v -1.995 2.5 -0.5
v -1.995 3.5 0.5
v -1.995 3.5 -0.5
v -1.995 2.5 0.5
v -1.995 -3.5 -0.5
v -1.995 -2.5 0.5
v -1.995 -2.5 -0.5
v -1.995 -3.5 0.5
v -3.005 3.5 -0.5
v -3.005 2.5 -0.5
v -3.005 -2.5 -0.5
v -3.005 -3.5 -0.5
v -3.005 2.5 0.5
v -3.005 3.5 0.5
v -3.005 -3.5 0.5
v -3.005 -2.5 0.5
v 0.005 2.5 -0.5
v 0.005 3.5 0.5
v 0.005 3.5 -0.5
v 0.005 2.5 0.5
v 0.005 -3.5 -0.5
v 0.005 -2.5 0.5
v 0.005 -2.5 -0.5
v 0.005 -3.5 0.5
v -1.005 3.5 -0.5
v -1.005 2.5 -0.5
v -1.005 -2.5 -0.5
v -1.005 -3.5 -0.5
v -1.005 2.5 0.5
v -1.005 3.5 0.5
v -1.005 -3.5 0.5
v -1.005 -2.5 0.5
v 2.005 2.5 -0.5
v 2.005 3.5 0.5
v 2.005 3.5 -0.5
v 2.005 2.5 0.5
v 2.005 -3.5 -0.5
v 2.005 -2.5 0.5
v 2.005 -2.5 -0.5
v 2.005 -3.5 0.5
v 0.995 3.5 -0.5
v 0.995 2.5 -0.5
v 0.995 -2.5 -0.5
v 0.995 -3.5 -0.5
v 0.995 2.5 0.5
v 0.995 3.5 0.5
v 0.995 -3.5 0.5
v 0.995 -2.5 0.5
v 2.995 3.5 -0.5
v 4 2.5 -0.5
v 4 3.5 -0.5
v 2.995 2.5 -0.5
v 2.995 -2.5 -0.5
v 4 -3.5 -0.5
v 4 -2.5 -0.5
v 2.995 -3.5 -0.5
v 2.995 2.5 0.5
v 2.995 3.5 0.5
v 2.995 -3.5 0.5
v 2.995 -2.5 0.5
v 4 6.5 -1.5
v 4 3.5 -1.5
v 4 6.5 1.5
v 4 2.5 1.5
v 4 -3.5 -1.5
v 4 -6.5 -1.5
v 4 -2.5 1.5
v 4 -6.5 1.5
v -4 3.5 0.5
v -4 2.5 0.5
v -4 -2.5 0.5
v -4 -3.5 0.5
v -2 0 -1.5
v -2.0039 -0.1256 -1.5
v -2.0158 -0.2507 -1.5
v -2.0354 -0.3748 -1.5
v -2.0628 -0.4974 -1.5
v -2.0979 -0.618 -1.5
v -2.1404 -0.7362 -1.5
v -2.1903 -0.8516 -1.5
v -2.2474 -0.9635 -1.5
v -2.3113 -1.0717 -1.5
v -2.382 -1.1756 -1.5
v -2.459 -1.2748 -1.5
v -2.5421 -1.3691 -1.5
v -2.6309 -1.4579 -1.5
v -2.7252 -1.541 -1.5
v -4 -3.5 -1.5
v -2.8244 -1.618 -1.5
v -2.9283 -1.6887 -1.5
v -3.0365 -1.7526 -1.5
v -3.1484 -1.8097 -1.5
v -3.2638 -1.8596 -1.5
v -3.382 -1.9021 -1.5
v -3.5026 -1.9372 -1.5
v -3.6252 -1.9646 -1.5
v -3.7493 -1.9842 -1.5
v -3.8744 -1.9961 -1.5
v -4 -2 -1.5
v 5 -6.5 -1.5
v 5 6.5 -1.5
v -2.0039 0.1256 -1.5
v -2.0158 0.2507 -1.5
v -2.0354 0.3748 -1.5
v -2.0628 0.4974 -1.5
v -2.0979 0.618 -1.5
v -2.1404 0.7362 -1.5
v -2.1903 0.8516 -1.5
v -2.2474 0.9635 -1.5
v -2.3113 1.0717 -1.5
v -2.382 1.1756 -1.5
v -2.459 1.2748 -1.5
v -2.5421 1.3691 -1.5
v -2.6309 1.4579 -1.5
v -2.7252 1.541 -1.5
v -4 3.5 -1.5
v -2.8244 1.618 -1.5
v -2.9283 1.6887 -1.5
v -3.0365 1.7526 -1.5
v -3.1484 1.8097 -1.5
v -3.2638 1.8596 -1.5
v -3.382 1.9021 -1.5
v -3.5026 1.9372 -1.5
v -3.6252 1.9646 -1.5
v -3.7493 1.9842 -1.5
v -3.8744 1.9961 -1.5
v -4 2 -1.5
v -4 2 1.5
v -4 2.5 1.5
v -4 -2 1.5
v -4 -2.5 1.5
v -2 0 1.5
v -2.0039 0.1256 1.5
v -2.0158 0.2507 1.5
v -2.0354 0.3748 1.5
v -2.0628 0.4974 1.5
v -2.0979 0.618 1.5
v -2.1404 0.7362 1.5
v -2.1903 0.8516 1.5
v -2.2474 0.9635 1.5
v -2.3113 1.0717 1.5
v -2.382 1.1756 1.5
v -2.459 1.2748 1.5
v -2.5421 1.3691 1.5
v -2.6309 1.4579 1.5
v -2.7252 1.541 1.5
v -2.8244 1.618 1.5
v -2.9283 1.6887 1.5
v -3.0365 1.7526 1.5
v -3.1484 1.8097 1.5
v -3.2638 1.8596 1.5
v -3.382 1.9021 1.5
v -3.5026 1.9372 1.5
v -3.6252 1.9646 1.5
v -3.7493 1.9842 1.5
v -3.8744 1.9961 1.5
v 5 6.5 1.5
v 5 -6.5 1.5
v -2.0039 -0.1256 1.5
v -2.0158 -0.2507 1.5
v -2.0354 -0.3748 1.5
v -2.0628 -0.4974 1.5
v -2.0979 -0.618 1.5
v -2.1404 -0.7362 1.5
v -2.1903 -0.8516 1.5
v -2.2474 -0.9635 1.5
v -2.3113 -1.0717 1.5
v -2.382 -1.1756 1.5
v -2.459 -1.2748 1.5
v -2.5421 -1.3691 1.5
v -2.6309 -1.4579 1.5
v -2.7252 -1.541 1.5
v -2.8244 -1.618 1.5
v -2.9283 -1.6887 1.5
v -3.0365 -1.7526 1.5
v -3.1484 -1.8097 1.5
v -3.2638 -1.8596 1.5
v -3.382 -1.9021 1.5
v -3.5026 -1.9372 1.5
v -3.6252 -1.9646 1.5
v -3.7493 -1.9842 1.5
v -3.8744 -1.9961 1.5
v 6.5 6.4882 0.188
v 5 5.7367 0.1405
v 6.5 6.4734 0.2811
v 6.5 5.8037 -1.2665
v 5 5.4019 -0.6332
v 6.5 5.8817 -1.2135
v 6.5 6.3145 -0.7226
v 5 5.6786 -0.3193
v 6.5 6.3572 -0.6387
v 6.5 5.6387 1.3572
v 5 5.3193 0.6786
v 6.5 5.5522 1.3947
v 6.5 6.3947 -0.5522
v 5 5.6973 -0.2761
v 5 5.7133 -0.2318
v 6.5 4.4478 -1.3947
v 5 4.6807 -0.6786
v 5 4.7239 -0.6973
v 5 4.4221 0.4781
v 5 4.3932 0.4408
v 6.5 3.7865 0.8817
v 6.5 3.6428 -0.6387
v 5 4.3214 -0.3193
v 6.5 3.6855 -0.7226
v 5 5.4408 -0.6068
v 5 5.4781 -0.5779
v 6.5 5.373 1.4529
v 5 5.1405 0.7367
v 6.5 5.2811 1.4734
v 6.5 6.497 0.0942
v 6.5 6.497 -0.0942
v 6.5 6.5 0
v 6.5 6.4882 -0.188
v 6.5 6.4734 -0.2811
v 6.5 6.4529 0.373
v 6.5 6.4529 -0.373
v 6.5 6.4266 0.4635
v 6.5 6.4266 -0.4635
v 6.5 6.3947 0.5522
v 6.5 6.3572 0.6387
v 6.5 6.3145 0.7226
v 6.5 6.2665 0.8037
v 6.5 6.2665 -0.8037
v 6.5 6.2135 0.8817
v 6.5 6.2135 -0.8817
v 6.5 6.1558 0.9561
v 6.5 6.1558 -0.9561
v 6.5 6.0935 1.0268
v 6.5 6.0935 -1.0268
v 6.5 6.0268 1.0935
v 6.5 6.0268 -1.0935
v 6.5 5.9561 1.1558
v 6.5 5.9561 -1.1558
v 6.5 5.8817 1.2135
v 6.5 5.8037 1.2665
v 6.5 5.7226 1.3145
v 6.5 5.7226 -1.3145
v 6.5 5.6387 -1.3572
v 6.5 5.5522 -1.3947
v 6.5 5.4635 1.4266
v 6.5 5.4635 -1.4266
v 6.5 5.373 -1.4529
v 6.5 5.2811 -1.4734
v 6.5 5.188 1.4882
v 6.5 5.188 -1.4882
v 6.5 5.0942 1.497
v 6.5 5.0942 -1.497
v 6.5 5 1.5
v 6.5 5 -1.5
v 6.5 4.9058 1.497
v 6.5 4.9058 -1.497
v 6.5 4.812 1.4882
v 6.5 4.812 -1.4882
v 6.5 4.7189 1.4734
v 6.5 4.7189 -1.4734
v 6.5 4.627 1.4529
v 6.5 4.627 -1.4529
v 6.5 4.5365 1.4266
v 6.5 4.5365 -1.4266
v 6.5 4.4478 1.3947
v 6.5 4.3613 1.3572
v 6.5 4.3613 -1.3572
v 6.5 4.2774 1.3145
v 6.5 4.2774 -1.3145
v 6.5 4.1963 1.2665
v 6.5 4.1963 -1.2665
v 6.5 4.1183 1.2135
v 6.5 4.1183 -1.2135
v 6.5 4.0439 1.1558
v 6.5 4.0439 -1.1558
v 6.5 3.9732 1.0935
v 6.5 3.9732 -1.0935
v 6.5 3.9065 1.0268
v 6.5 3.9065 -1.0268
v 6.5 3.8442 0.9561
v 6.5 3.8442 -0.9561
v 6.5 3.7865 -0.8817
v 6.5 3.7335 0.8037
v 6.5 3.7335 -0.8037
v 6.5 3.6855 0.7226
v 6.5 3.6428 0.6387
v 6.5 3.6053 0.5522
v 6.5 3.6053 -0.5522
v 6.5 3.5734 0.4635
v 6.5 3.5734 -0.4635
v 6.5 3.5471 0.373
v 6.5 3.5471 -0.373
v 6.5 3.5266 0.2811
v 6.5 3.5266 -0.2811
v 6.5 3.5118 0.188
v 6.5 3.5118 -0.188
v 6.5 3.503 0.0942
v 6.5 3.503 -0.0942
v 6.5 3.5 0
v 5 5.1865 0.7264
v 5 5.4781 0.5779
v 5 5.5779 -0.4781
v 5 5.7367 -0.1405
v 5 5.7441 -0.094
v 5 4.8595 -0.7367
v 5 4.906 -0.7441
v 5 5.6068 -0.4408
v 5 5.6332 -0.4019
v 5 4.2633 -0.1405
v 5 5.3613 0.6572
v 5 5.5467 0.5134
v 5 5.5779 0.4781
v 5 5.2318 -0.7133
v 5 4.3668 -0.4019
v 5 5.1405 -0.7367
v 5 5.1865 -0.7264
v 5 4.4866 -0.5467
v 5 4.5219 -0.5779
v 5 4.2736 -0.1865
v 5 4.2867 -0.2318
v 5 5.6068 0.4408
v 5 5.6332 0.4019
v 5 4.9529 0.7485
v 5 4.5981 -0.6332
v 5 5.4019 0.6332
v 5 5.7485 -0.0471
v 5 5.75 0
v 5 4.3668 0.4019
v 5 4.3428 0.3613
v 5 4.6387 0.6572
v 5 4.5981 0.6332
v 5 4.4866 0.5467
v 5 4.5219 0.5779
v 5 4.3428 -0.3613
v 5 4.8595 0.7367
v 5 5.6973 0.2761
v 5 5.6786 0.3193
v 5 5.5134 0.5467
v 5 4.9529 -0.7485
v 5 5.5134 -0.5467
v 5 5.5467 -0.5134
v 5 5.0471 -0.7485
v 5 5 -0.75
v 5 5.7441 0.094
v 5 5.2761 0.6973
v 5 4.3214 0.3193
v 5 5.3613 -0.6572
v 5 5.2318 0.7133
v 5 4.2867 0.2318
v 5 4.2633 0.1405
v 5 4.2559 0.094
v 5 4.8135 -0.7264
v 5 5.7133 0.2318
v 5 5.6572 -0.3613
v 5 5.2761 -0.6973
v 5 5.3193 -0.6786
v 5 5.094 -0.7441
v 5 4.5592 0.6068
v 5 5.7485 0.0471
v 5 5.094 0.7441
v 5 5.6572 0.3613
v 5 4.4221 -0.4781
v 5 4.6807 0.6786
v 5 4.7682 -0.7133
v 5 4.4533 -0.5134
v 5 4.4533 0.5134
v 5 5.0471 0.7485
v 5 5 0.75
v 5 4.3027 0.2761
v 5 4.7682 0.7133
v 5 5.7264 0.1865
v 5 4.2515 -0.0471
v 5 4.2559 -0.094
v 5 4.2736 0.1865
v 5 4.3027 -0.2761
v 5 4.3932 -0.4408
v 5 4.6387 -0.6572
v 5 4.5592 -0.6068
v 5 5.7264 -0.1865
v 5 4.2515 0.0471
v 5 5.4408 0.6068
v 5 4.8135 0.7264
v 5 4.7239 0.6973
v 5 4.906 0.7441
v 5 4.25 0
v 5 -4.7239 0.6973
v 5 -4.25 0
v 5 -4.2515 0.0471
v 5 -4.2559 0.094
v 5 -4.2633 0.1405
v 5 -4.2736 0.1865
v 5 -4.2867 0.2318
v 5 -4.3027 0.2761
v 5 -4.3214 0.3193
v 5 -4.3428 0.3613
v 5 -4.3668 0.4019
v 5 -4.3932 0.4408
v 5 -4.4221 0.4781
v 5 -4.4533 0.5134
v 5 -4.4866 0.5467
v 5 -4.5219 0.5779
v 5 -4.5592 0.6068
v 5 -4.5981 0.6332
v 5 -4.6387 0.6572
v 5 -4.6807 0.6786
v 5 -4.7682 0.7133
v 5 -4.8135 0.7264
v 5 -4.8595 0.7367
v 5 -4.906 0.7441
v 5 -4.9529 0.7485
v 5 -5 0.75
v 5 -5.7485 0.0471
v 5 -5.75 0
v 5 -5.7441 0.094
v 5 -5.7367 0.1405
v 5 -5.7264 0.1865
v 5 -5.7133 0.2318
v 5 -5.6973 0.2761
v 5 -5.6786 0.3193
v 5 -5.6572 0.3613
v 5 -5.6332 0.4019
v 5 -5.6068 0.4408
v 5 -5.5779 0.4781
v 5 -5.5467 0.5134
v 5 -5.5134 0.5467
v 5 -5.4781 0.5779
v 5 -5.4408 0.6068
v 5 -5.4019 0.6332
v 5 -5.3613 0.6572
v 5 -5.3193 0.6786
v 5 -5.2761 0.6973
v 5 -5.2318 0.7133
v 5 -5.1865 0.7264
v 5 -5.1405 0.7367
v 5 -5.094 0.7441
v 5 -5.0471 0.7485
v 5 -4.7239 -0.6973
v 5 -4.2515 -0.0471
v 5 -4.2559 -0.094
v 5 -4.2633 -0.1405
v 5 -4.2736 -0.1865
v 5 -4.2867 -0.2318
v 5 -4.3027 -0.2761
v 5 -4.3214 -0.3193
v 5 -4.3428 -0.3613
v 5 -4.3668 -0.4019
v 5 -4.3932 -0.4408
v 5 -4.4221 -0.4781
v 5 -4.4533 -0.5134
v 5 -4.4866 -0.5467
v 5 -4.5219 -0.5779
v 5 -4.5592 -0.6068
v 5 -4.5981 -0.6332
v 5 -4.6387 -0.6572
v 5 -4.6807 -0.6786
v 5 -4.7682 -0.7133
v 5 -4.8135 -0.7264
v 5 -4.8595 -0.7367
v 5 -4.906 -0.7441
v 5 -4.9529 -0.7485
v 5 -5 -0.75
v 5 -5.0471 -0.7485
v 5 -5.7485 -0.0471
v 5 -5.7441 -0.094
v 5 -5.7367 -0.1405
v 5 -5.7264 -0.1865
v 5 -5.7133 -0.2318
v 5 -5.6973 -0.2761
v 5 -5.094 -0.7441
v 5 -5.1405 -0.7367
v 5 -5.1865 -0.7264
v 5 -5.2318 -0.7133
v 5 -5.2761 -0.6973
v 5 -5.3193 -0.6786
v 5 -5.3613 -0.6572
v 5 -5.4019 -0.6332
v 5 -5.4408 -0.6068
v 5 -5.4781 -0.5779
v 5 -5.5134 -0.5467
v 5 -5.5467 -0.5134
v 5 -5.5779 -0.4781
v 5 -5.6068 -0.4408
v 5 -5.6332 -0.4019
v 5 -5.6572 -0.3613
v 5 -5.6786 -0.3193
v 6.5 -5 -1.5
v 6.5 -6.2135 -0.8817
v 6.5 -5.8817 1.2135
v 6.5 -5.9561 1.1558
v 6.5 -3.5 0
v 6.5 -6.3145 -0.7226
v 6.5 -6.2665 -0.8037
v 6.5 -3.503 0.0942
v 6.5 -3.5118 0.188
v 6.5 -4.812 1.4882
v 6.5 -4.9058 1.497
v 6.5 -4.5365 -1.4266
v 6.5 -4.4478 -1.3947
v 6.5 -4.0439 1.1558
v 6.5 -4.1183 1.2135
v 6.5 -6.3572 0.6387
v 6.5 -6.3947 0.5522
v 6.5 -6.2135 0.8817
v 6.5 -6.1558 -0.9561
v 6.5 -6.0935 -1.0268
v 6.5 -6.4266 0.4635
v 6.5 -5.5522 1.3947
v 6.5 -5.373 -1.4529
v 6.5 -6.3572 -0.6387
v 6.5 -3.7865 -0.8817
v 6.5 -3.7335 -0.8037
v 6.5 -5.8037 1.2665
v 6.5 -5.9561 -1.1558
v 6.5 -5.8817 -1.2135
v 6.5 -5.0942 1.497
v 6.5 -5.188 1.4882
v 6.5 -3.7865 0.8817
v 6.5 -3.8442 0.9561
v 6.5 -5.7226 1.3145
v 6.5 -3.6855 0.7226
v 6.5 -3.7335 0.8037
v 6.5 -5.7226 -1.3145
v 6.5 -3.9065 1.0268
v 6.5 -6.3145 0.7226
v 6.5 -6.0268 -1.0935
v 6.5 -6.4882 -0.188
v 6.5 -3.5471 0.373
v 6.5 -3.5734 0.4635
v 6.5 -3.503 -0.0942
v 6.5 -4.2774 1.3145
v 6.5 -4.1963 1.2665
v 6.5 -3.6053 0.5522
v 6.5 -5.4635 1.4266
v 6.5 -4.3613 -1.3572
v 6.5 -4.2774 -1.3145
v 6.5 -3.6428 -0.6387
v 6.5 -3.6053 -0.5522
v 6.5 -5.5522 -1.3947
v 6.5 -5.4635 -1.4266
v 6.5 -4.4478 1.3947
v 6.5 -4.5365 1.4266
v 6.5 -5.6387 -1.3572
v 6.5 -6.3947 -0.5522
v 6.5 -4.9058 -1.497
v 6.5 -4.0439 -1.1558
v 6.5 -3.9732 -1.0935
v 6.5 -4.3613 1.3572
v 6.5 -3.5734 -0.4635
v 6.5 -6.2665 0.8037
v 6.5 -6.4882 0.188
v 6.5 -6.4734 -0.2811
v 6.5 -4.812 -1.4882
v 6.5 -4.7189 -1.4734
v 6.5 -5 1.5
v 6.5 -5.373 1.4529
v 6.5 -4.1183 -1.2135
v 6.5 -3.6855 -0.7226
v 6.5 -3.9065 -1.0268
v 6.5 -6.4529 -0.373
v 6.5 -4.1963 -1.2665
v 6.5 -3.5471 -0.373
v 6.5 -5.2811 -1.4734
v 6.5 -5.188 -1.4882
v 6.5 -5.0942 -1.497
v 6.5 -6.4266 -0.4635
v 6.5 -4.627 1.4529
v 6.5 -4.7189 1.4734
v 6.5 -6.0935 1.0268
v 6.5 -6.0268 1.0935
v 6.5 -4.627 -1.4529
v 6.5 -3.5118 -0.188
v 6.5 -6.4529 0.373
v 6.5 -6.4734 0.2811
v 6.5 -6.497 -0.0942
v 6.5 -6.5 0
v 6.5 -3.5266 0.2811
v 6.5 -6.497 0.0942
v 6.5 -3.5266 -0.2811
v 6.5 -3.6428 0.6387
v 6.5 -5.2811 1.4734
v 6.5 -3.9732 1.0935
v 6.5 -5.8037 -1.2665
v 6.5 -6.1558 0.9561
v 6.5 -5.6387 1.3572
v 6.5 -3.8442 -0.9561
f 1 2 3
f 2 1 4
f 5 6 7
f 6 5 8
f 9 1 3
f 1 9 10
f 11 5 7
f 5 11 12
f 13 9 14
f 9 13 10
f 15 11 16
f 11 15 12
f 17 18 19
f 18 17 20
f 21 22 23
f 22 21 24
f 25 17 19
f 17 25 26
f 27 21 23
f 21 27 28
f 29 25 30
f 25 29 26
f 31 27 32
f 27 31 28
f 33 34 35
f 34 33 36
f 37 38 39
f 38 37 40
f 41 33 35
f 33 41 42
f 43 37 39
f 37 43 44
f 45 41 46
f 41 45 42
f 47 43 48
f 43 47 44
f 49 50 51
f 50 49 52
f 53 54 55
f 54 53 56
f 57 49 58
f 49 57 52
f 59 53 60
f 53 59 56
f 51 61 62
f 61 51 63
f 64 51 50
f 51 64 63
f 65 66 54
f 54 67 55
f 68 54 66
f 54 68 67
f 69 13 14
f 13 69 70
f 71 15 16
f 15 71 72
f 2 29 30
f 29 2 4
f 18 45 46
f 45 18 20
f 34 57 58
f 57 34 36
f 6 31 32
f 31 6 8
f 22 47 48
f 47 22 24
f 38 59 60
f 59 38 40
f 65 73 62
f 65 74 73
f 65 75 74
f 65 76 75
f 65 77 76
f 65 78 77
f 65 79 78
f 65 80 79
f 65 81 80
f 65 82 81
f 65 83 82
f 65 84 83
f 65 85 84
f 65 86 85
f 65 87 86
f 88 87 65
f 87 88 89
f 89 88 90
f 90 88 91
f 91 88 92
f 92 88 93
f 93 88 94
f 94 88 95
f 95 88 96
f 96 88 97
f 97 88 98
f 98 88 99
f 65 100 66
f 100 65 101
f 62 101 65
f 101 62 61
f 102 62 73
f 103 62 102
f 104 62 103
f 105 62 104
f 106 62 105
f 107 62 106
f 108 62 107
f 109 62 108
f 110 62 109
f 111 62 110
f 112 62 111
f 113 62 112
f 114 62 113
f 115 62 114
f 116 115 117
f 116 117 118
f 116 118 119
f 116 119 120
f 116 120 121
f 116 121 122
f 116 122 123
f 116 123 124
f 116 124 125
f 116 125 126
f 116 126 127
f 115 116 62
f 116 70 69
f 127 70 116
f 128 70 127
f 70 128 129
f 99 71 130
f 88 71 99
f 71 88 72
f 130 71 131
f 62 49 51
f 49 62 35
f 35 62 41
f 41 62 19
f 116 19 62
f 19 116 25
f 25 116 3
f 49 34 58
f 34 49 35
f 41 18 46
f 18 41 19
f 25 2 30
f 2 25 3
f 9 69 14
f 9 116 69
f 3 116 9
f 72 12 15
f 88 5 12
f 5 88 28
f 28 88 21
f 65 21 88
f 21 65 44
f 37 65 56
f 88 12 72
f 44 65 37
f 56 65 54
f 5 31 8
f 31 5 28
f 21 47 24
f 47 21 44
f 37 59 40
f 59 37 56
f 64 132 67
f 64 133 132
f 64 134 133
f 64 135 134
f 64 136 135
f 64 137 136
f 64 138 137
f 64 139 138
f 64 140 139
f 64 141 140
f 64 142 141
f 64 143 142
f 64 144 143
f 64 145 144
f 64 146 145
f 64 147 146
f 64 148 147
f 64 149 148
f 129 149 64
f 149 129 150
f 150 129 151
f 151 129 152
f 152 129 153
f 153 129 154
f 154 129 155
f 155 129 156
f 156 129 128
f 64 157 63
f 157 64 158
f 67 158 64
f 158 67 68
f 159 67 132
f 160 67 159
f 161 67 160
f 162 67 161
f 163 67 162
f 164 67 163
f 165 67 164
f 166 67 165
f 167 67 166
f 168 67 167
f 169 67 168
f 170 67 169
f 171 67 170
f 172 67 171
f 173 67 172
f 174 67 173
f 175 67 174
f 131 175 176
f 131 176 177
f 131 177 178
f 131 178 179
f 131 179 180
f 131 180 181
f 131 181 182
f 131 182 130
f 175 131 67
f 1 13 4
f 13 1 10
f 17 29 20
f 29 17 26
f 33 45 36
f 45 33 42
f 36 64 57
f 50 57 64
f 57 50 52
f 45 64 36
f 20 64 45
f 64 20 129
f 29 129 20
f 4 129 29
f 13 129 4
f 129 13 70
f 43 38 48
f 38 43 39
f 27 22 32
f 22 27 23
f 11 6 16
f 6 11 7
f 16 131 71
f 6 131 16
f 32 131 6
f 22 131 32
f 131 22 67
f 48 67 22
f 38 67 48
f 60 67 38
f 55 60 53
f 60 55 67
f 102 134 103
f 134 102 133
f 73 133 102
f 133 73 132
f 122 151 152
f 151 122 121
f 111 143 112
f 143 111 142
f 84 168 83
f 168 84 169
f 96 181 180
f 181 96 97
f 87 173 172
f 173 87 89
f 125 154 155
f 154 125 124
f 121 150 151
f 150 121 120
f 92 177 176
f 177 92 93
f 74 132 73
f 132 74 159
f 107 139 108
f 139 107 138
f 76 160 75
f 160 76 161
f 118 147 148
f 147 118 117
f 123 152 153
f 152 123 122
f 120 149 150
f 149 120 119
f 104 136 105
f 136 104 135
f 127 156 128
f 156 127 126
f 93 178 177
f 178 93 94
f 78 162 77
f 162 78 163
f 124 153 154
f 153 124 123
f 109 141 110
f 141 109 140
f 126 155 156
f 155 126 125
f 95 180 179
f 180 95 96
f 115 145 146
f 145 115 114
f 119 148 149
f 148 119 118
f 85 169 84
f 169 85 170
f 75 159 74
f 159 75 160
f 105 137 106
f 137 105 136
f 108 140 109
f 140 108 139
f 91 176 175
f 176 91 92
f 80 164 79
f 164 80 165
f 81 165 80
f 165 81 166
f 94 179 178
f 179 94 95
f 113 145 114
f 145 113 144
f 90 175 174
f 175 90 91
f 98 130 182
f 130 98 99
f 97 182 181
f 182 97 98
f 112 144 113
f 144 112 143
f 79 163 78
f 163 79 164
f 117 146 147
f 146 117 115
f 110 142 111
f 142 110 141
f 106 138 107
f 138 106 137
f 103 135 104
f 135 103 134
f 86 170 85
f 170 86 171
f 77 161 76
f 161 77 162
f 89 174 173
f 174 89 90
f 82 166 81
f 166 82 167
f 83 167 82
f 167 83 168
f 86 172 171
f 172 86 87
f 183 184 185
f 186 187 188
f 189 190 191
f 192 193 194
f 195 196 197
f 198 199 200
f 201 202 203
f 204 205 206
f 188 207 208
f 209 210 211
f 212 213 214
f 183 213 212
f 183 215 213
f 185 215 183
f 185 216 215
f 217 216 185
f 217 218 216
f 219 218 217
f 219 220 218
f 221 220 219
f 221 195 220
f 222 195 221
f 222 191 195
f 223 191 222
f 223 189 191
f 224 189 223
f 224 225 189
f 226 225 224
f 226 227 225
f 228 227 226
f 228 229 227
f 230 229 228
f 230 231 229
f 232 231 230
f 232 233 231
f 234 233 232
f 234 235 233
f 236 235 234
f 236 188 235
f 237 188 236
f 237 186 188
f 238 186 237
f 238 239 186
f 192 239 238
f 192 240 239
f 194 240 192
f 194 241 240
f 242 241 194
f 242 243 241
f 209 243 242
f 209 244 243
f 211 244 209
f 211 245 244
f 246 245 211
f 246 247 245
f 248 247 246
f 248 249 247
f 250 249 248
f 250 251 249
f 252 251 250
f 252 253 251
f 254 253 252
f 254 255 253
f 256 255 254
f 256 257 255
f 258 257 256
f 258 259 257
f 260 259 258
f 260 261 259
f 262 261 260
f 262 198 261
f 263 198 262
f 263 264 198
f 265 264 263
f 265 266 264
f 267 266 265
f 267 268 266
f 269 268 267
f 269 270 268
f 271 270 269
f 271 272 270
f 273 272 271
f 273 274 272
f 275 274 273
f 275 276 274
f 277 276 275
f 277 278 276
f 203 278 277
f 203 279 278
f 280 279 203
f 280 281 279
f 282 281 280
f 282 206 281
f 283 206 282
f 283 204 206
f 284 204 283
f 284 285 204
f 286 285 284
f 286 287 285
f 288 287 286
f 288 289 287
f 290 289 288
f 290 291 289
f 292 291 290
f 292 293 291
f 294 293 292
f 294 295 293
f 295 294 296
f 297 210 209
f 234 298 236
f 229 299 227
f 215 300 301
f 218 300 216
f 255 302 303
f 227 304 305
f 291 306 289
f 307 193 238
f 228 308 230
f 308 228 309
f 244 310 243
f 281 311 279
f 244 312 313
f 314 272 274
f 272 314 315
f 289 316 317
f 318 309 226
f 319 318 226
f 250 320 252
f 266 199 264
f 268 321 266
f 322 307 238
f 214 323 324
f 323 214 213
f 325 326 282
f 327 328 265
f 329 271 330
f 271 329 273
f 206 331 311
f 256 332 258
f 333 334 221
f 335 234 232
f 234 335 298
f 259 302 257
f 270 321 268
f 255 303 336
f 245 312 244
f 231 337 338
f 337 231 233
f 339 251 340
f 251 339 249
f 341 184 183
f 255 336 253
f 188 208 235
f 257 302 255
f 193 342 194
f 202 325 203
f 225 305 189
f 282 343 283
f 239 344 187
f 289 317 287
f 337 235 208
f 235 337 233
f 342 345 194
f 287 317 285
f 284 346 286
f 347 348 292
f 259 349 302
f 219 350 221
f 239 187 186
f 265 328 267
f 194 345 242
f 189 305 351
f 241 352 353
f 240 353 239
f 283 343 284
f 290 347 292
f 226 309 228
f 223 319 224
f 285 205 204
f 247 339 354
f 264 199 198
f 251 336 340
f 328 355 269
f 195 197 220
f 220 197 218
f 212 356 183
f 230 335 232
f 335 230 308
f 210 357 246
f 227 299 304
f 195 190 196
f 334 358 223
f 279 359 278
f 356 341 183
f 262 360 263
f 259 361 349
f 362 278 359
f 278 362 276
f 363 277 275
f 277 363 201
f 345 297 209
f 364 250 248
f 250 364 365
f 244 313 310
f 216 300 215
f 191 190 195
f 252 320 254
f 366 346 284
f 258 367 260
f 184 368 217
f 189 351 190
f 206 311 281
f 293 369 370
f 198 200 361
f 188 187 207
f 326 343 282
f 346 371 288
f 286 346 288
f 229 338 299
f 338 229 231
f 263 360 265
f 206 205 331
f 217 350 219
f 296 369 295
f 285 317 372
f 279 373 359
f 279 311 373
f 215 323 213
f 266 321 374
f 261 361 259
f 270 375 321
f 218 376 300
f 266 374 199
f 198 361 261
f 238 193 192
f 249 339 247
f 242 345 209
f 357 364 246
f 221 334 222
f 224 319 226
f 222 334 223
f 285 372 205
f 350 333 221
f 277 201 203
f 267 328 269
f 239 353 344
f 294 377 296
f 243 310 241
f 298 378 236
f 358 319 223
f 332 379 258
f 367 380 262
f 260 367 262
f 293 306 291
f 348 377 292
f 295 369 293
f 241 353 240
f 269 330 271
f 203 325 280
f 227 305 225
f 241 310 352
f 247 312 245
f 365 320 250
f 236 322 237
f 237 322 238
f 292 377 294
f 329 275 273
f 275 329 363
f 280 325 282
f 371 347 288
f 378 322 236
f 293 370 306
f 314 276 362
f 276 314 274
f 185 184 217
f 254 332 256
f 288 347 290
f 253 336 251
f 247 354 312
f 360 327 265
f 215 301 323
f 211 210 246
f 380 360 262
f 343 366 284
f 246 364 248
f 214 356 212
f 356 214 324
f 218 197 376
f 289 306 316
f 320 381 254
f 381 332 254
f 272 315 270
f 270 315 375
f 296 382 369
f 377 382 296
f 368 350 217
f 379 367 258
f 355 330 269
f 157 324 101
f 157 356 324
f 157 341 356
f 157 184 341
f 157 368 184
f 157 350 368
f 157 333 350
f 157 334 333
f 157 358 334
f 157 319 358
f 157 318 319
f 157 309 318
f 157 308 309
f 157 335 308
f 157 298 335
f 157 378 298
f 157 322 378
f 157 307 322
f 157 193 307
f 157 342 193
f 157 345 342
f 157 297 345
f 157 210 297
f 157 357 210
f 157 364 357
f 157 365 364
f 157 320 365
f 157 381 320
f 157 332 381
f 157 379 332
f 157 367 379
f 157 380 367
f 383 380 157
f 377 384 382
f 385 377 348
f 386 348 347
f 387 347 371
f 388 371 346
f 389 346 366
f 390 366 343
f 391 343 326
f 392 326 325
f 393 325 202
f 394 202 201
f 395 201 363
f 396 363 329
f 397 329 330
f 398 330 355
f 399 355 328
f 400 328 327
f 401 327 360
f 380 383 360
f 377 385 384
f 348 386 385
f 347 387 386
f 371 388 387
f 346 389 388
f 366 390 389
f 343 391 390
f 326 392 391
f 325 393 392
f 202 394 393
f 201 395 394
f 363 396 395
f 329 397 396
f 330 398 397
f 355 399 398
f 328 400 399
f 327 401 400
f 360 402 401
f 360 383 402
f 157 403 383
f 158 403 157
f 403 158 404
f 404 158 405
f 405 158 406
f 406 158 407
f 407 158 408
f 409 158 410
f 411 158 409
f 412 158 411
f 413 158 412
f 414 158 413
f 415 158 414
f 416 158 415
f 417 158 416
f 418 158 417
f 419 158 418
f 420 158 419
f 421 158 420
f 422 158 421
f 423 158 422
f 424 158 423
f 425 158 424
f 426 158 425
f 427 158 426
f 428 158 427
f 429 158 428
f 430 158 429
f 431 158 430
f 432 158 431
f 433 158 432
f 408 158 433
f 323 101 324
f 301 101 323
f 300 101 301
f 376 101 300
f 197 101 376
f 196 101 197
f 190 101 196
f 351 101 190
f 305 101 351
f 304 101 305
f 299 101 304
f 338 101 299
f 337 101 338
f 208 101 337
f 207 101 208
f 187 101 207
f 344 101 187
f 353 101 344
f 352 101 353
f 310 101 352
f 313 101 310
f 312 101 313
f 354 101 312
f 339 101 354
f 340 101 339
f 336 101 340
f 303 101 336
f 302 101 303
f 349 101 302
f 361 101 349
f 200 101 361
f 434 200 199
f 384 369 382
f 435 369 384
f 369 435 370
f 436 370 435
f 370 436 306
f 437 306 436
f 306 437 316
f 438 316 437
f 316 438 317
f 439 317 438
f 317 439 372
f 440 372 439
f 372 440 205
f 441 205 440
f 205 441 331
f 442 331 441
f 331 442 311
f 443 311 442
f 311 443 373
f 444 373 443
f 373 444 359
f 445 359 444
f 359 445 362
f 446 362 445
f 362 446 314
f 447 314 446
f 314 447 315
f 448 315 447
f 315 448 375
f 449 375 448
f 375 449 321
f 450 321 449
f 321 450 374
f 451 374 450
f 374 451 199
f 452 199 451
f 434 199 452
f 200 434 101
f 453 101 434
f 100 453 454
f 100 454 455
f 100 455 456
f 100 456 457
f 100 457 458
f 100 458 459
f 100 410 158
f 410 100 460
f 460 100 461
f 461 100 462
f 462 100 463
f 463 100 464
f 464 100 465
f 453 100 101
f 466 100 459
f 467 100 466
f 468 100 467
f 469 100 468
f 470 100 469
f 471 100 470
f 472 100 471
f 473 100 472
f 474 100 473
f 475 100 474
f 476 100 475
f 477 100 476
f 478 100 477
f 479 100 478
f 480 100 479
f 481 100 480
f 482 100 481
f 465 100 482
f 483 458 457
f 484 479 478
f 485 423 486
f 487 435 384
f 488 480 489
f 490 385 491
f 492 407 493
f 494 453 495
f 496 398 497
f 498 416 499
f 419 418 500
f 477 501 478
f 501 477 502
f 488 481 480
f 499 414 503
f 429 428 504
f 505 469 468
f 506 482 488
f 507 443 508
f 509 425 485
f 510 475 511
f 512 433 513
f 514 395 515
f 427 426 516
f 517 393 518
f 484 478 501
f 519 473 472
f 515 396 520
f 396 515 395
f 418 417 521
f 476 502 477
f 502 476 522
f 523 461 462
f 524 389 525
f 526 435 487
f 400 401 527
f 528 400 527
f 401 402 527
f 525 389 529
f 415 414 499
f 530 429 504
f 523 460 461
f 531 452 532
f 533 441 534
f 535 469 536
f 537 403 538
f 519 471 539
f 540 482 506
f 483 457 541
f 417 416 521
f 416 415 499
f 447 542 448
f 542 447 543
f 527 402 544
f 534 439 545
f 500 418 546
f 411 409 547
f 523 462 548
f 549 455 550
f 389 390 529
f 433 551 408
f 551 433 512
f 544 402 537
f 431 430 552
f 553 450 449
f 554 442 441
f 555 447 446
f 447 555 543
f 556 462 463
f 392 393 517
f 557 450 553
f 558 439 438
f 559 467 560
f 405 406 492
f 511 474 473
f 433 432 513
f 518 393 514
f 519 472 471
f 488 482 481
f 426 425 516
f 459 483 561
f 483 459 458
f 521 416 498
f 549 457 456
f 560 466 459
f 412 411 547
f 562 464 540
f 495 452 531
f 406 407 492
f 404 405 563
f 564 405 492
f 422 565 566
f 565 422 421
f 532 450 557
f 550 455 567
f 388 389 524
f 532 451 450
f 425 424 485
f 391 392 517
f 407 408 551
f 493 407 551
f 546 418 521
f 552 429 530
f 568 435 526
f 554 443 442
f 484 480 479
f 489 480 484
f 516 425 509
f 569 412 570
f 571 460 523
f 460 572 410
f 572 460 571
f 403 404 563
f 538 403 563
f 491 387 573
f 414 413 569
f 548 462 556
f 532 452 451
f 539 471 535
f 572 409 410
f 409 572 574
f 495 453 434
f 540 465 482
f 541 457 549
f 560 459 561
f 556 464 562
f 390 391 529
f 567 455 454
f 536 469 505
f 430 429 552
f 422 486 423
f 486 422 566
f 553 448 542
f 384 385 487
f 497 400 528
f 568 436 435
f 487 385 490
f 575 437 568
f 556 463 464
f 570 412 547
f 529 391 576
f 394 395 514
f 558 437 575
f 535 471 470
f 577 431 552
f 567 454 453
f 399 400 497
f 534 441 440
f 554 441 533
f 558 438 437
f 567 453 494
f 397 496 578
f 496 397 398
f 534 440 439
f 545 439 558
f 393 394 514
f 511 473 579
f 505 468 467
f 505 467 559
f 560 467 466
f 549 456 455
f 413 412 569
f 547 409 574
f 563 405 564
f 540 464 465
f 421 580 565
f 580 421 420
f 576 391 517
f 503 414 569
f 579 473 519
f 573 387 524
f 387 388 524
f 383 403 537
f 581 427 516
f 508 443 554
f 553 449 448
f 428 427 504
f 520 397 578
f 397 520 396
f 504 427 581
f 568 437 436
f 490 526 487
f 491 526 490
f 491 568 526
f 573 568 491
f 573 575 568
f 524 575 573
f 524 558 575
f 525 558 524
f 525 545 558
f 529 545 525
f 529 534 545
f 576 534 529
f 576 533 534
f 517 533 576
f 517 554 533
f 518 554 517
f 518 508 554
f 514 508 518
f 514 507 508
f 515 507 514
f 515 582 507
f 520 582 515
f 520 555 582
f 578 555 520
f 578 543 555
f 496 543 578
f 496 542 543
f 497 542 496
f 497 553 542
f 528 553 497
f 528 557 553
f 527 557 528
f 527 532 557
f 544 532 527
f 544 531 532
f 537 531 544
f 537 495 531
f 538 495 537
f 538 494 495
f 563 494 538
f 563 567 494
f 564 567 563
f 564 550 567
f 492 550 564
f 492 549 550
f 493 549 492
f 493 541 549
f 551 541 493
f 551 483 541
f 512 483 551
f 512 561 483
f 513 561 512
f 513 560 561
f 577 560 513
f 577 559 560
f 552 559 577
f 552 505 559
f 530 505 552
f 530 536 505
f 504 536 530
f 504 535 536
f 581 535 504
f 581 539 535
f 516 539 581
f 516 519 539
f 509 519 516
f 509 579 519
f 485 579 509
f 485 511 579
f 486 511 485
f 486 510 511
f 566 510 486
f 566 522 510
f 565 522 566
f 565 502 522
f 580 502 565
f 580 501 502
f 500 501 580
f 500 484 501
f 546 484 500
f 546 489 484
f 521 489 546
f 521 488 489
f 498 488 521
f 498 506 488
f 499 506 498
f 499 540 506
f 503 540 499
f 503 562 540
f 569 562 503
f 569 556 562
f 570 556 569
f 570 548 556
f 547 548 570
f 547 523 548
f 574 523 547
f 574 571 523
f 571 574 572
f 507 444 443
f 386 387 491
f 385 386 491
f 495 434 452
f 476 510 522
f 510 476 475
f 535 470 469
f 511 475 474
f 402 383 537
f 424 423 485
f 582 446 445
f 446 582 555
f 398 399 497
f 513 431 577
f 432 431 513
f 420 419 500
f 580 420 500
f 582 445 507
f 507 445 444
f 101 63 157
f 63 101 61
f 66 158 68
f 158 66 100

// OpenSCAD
POLE_RADIUS=2;
WALL_HEIGHT=2;

TOOTH_DEPTH=1;
TOOTH_WIDTH=1;

WALL_THICK = 3;

BASE_WIDTH = POLE_RADIUS * 2 + WALL_THICK;
BASE_LENGHT = BASE_WIDTH + 1;

BUTTON_DISTANCE = 10;
BUTTON_H = 1.5;
BUTTON_R2 = (WALL_HEIGHT + TOOTH_DEPTH) / 2;
BUTTON_R1 = BUTTON_R2 / 2;

difference() {
    union () {
        difference() {
            translate([0, 0, -(TOOTH_DEPTH / 2)])
                cube([BASE_LENGHT, BASE_WIDTH, WALL_HEIGHT], true);

            for(i = [1:BASE_LENGHT / (TOOTH_WIDTH * 2)]) {
                STEP = TOOTH_WIDTH * 2;
                START = (BASE_LENGHT / 2) + (TOOTH_WIDTH / 2);
                translate([(-START + STEP * i), 0, TOOTH_DEPTH / 2])
                    cube([TOOTH_WIDTH + 0.01, BASE_WIDTH * 2, TOOTH_DEPTH * 2], true);
            }
        }

        cube([BASE_LENGHT, BASE_WIDTH - (TOOTH_WIDTH * 2), (WALL_HEIGHT + TOOTH_DEPTH)], true);
    }

    union() {
        translate([-(BASE_LENGHT / 2), 0, 0])
            cylinder(h = WALL_HEIGHT * 4, r = POLE_RADIUS, center = true, $fn = 100);
    }
}

// End holder part
translate([(BASE_LENGHT / 2) + (TOOTH_WIDTH / 2), 0, 0])
    cube([TOOTH_WIDTH, BUTTON_DISTANCE + (BUTTON_R2 * 2), (WALL_HEIGHT + TOOTH_DEPTH)], true);

translate([(BASE_LENGHT / 2) + TOOTH_WIDTH + (BUTTON_H / 2), 0, 0]) {
    rotate([0,90,0]) {
        translate([0, BUTTON_DISTANCE / 2, 0])
            cylinder(h = BUTTON_H, r1 = BUTTON_R1, r2 = BUTTON_R2, center = true, $fn = 100);
        translate([0, -(BUTTON_DISTANCE / 2), 0])
            cylinder(h = BUTTON_H, r1 = BUTTON_R1, r2 = BUTTON_R2, center = true, $fn = 100);
    }
}
